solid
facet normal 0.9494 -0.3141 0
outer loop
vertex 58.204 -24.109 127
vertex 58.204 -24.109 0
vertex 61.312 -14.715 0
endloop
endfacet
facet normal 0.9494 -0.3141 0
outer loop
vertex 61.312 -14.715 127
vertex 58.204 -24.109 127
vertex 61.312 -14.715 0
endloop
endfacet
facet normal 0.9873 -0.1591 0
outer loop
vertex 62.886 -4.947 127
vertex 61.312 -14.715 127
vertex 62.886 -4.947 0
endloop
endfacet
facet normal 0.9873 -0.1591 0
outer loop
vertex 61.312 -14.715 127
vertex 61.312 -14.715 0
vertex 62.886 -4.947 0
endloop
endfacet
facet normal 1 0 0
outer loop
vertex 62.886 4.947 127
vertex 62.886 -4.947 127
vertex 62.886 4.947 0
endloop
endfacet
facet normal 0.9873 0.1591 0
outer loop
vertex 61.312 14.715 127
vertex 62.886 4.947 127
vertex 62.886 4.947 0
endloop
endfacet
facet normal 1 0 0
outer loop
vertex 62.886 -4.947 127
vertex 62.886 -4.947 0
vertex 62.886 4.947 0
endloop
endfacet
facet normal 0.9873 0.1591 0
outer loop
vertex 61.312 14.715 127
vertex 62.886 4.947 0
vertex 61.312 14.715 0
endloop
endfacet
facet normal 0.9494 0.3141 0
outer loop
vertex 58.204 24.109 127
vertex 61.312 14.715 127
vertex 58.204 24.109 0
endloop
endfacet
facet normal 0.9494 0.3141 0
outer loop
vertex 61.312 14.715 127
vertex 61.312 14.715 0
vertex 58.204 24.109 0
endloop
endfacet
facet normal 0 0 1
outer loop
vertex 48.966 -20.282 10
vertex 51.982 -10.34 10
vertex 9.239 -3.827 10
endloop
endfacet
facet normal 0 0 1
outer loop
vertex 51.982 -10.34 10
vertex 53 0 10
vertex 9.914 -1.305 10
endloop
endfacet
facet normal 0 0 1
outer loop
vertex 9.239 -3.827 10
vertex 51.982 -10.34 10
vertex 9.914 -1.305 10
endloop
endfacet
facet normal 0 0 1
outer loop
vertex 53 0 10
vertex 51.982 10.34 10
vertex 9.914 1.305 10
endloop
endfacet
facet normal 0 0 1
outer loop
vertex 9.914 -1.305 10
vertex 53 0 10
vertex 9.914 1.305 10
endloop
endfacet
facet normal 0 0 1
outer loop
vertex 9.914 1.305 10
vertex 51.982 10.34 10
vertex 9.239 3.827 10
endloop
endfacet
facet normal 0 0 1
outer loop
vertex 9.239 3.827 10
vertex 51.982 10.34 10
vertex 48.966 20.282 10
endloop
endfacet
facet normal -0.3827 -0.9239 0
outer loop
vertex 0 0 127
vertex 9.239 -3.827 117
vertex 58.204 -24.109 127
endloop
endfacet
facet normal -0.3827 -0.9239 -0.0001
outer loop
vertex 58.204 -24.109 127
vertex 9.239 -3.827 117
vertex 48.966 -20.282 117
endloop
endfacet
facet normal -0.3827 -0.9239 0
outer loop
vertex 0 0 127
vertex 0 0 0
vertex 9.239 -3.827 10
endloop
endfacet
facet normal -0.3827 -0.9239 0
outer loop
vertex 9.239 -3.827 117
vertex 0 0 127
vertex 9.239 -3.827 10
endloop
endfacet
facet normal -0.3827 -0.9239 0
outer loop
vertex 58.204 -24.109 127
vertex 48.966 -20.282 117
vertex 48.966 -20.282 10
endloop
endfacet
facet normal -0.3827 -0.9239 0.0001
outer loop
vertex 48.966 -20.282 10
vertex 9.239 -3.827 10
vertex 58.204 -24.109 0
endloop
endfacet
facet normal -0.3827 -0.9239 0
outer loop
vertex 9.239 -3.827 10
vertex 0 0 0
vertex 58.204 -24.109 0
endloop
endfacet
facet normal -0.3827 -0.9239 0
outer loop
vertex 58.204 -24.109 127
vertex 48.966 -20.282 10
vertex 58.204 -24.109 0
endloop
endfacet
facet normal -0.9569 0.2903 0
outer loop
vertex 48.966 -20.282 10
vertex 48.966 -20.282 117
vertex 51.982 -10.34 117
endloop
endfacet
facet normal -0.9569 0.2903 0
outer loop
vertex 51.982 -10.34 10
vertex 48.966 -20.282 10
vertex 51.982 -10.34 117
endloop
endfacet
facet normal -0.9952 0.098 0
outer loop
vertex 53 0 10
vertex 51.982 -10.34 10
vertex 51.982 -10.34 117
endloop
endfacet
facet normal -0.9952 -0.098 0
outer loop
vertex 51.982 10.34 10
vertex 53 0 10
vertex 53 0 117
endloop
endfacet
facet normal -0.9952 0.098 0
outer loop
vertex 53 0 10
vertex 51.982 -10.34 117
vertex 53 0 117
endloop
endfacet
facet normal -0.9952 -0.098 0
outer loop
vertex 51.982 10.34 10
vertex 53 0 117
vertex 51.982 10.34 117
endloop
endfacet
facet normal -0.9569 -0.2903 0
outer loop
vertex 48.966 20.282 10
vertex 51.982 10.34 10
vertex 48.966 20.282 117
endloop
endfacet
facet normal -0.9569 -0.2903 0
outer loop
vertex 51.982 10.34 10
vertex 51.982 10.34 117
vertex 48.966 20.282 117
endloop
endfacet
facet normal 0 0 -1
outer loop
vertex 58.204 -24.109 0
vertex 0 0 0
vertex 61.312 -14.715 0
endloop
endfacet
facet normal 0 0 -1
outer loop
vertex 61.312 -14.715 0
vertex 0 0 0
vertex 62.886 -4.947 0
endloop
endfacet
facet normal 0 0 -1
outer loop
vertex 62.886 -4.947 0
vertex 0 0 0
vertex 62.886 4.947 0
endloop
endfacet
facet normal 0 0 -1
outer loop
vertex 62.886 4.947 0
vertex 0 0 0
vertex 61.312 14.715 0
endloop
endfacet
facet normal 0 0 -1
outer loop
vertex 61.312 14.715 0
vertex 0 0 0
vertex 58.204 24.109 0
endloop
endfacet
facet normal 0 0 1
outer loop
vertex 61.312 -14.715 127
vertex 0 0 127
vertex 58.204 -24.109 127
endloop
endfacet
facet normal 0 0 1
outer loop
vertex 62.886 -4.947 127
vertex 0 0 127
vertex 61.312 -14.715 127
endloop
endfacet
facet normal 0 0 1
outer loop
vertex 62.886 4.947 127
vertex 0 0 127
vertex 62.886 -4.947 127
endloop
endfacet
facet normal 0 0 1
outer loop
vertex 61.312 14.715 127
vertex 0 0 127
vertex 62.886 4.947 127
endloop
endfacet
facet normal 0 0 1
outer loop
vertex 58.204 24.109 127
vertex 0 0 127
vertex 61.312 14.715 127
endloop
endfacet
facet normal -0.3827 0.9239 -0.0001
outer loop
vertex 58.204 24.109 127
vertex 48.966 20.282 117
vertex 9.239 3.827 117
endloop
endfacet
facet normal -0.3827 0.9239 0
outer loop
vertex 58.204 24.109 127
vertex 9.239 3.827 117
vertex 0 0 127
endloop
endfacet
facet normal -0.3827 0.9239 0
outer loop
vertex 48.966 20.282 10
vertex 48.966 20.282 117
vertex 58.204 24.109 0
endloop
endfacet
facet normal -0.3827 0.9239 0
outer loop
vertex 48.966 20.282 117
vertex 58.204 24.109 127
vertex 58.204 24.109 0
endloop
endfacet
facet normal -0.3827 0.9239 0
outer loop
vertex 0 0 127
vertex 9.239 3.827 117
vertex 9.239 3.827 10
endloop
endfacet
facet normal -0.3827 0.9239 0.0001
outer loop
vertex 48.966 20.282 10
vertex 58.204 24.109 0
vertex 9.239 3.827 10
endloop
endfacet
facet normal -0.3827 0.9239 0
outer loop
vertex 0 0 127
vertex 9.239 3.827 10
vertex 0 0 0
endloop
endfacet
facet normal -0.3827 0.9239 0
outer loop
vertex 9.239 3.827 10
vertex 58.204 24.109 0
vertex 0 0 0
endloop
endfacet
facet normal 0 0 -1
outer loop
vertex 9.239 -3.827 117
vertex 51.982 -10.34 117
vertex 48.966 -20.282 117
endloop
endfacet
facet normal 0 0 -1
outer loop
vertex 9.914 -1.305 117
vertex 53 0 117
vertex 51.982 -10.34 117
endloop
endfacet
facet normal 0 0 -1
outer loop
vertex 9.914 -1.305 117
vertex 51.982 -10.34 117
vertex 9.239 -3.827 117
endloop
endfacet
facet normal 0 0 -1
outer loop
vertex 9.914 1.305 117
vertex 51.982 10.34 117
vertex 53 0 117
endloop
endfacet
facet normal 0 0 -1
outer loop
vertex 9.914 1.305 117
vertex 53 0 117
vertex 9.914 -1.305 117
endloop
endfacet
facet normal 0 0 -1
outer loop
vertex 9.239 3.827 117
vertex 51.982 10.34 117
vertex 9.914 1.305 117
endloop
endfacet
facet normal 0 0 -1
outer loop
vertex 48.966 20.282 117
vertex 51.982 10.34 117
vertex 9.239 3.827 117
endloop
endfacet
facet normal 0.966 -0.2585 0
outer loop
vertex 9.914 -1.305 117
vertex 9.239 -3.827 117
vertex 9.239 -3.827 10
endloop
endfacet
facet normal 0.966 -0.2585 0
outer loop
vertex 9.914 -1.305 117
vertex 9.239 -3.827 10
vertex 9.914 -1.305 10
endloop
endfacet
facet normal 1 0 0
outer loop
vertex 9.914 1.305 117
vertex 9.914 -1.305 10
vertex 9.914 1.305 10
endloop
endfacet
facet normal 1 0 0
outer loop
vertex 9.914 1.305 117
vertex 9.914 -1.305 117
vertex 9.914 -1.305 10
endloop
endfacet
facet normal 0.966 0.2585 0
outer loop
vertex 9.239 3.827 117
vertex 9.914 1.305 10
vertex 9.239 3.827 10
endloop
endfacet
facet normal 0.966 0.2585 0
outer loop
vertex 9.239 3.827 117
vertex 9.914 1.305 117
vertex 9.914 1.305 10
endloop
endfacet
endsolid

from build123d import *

# Parameters (mm, degrees)
F1_DEPTH = 127
F2_W     = 43.000000447
F2_H     = 107.000000447
F3_ANGLE = 85


with BuildPart() as f1:
    # F0 (on Top) → F1 (new body)
    with BuildSketch(Plane.XY):
        with BuildLine():
            Line((58.2044105482, 24.109056239), (0, 0))
            Line((0, 0), (58.2044105482, -24.109056239))
            ThreePointArc((58.2044105482, -24.109056239), (63.0838940304, 0), (58.2044105482, 24.109056239))
        make_face()
    extrude(amount=F1_DEPTH)

    # F2 (on face) → F3 (revolve, cut)
    with BuildSketch(Plane(origin=(0, 0, 0), x_dir=(0.9238795325, -0.3826834324, 0), z_dir=(-0.3826834324, -0.9238795325, 0))):
        with Locations((31.5, 63.5)):
            Rectangle(F2_W, F2_H)
    revolve(axis=Axis((0, 0, 63.5), (0, 0, 1)), revolution_arc=F3_ANGLE, mode=Mode.SUBTRACT)


solid = f1.part
